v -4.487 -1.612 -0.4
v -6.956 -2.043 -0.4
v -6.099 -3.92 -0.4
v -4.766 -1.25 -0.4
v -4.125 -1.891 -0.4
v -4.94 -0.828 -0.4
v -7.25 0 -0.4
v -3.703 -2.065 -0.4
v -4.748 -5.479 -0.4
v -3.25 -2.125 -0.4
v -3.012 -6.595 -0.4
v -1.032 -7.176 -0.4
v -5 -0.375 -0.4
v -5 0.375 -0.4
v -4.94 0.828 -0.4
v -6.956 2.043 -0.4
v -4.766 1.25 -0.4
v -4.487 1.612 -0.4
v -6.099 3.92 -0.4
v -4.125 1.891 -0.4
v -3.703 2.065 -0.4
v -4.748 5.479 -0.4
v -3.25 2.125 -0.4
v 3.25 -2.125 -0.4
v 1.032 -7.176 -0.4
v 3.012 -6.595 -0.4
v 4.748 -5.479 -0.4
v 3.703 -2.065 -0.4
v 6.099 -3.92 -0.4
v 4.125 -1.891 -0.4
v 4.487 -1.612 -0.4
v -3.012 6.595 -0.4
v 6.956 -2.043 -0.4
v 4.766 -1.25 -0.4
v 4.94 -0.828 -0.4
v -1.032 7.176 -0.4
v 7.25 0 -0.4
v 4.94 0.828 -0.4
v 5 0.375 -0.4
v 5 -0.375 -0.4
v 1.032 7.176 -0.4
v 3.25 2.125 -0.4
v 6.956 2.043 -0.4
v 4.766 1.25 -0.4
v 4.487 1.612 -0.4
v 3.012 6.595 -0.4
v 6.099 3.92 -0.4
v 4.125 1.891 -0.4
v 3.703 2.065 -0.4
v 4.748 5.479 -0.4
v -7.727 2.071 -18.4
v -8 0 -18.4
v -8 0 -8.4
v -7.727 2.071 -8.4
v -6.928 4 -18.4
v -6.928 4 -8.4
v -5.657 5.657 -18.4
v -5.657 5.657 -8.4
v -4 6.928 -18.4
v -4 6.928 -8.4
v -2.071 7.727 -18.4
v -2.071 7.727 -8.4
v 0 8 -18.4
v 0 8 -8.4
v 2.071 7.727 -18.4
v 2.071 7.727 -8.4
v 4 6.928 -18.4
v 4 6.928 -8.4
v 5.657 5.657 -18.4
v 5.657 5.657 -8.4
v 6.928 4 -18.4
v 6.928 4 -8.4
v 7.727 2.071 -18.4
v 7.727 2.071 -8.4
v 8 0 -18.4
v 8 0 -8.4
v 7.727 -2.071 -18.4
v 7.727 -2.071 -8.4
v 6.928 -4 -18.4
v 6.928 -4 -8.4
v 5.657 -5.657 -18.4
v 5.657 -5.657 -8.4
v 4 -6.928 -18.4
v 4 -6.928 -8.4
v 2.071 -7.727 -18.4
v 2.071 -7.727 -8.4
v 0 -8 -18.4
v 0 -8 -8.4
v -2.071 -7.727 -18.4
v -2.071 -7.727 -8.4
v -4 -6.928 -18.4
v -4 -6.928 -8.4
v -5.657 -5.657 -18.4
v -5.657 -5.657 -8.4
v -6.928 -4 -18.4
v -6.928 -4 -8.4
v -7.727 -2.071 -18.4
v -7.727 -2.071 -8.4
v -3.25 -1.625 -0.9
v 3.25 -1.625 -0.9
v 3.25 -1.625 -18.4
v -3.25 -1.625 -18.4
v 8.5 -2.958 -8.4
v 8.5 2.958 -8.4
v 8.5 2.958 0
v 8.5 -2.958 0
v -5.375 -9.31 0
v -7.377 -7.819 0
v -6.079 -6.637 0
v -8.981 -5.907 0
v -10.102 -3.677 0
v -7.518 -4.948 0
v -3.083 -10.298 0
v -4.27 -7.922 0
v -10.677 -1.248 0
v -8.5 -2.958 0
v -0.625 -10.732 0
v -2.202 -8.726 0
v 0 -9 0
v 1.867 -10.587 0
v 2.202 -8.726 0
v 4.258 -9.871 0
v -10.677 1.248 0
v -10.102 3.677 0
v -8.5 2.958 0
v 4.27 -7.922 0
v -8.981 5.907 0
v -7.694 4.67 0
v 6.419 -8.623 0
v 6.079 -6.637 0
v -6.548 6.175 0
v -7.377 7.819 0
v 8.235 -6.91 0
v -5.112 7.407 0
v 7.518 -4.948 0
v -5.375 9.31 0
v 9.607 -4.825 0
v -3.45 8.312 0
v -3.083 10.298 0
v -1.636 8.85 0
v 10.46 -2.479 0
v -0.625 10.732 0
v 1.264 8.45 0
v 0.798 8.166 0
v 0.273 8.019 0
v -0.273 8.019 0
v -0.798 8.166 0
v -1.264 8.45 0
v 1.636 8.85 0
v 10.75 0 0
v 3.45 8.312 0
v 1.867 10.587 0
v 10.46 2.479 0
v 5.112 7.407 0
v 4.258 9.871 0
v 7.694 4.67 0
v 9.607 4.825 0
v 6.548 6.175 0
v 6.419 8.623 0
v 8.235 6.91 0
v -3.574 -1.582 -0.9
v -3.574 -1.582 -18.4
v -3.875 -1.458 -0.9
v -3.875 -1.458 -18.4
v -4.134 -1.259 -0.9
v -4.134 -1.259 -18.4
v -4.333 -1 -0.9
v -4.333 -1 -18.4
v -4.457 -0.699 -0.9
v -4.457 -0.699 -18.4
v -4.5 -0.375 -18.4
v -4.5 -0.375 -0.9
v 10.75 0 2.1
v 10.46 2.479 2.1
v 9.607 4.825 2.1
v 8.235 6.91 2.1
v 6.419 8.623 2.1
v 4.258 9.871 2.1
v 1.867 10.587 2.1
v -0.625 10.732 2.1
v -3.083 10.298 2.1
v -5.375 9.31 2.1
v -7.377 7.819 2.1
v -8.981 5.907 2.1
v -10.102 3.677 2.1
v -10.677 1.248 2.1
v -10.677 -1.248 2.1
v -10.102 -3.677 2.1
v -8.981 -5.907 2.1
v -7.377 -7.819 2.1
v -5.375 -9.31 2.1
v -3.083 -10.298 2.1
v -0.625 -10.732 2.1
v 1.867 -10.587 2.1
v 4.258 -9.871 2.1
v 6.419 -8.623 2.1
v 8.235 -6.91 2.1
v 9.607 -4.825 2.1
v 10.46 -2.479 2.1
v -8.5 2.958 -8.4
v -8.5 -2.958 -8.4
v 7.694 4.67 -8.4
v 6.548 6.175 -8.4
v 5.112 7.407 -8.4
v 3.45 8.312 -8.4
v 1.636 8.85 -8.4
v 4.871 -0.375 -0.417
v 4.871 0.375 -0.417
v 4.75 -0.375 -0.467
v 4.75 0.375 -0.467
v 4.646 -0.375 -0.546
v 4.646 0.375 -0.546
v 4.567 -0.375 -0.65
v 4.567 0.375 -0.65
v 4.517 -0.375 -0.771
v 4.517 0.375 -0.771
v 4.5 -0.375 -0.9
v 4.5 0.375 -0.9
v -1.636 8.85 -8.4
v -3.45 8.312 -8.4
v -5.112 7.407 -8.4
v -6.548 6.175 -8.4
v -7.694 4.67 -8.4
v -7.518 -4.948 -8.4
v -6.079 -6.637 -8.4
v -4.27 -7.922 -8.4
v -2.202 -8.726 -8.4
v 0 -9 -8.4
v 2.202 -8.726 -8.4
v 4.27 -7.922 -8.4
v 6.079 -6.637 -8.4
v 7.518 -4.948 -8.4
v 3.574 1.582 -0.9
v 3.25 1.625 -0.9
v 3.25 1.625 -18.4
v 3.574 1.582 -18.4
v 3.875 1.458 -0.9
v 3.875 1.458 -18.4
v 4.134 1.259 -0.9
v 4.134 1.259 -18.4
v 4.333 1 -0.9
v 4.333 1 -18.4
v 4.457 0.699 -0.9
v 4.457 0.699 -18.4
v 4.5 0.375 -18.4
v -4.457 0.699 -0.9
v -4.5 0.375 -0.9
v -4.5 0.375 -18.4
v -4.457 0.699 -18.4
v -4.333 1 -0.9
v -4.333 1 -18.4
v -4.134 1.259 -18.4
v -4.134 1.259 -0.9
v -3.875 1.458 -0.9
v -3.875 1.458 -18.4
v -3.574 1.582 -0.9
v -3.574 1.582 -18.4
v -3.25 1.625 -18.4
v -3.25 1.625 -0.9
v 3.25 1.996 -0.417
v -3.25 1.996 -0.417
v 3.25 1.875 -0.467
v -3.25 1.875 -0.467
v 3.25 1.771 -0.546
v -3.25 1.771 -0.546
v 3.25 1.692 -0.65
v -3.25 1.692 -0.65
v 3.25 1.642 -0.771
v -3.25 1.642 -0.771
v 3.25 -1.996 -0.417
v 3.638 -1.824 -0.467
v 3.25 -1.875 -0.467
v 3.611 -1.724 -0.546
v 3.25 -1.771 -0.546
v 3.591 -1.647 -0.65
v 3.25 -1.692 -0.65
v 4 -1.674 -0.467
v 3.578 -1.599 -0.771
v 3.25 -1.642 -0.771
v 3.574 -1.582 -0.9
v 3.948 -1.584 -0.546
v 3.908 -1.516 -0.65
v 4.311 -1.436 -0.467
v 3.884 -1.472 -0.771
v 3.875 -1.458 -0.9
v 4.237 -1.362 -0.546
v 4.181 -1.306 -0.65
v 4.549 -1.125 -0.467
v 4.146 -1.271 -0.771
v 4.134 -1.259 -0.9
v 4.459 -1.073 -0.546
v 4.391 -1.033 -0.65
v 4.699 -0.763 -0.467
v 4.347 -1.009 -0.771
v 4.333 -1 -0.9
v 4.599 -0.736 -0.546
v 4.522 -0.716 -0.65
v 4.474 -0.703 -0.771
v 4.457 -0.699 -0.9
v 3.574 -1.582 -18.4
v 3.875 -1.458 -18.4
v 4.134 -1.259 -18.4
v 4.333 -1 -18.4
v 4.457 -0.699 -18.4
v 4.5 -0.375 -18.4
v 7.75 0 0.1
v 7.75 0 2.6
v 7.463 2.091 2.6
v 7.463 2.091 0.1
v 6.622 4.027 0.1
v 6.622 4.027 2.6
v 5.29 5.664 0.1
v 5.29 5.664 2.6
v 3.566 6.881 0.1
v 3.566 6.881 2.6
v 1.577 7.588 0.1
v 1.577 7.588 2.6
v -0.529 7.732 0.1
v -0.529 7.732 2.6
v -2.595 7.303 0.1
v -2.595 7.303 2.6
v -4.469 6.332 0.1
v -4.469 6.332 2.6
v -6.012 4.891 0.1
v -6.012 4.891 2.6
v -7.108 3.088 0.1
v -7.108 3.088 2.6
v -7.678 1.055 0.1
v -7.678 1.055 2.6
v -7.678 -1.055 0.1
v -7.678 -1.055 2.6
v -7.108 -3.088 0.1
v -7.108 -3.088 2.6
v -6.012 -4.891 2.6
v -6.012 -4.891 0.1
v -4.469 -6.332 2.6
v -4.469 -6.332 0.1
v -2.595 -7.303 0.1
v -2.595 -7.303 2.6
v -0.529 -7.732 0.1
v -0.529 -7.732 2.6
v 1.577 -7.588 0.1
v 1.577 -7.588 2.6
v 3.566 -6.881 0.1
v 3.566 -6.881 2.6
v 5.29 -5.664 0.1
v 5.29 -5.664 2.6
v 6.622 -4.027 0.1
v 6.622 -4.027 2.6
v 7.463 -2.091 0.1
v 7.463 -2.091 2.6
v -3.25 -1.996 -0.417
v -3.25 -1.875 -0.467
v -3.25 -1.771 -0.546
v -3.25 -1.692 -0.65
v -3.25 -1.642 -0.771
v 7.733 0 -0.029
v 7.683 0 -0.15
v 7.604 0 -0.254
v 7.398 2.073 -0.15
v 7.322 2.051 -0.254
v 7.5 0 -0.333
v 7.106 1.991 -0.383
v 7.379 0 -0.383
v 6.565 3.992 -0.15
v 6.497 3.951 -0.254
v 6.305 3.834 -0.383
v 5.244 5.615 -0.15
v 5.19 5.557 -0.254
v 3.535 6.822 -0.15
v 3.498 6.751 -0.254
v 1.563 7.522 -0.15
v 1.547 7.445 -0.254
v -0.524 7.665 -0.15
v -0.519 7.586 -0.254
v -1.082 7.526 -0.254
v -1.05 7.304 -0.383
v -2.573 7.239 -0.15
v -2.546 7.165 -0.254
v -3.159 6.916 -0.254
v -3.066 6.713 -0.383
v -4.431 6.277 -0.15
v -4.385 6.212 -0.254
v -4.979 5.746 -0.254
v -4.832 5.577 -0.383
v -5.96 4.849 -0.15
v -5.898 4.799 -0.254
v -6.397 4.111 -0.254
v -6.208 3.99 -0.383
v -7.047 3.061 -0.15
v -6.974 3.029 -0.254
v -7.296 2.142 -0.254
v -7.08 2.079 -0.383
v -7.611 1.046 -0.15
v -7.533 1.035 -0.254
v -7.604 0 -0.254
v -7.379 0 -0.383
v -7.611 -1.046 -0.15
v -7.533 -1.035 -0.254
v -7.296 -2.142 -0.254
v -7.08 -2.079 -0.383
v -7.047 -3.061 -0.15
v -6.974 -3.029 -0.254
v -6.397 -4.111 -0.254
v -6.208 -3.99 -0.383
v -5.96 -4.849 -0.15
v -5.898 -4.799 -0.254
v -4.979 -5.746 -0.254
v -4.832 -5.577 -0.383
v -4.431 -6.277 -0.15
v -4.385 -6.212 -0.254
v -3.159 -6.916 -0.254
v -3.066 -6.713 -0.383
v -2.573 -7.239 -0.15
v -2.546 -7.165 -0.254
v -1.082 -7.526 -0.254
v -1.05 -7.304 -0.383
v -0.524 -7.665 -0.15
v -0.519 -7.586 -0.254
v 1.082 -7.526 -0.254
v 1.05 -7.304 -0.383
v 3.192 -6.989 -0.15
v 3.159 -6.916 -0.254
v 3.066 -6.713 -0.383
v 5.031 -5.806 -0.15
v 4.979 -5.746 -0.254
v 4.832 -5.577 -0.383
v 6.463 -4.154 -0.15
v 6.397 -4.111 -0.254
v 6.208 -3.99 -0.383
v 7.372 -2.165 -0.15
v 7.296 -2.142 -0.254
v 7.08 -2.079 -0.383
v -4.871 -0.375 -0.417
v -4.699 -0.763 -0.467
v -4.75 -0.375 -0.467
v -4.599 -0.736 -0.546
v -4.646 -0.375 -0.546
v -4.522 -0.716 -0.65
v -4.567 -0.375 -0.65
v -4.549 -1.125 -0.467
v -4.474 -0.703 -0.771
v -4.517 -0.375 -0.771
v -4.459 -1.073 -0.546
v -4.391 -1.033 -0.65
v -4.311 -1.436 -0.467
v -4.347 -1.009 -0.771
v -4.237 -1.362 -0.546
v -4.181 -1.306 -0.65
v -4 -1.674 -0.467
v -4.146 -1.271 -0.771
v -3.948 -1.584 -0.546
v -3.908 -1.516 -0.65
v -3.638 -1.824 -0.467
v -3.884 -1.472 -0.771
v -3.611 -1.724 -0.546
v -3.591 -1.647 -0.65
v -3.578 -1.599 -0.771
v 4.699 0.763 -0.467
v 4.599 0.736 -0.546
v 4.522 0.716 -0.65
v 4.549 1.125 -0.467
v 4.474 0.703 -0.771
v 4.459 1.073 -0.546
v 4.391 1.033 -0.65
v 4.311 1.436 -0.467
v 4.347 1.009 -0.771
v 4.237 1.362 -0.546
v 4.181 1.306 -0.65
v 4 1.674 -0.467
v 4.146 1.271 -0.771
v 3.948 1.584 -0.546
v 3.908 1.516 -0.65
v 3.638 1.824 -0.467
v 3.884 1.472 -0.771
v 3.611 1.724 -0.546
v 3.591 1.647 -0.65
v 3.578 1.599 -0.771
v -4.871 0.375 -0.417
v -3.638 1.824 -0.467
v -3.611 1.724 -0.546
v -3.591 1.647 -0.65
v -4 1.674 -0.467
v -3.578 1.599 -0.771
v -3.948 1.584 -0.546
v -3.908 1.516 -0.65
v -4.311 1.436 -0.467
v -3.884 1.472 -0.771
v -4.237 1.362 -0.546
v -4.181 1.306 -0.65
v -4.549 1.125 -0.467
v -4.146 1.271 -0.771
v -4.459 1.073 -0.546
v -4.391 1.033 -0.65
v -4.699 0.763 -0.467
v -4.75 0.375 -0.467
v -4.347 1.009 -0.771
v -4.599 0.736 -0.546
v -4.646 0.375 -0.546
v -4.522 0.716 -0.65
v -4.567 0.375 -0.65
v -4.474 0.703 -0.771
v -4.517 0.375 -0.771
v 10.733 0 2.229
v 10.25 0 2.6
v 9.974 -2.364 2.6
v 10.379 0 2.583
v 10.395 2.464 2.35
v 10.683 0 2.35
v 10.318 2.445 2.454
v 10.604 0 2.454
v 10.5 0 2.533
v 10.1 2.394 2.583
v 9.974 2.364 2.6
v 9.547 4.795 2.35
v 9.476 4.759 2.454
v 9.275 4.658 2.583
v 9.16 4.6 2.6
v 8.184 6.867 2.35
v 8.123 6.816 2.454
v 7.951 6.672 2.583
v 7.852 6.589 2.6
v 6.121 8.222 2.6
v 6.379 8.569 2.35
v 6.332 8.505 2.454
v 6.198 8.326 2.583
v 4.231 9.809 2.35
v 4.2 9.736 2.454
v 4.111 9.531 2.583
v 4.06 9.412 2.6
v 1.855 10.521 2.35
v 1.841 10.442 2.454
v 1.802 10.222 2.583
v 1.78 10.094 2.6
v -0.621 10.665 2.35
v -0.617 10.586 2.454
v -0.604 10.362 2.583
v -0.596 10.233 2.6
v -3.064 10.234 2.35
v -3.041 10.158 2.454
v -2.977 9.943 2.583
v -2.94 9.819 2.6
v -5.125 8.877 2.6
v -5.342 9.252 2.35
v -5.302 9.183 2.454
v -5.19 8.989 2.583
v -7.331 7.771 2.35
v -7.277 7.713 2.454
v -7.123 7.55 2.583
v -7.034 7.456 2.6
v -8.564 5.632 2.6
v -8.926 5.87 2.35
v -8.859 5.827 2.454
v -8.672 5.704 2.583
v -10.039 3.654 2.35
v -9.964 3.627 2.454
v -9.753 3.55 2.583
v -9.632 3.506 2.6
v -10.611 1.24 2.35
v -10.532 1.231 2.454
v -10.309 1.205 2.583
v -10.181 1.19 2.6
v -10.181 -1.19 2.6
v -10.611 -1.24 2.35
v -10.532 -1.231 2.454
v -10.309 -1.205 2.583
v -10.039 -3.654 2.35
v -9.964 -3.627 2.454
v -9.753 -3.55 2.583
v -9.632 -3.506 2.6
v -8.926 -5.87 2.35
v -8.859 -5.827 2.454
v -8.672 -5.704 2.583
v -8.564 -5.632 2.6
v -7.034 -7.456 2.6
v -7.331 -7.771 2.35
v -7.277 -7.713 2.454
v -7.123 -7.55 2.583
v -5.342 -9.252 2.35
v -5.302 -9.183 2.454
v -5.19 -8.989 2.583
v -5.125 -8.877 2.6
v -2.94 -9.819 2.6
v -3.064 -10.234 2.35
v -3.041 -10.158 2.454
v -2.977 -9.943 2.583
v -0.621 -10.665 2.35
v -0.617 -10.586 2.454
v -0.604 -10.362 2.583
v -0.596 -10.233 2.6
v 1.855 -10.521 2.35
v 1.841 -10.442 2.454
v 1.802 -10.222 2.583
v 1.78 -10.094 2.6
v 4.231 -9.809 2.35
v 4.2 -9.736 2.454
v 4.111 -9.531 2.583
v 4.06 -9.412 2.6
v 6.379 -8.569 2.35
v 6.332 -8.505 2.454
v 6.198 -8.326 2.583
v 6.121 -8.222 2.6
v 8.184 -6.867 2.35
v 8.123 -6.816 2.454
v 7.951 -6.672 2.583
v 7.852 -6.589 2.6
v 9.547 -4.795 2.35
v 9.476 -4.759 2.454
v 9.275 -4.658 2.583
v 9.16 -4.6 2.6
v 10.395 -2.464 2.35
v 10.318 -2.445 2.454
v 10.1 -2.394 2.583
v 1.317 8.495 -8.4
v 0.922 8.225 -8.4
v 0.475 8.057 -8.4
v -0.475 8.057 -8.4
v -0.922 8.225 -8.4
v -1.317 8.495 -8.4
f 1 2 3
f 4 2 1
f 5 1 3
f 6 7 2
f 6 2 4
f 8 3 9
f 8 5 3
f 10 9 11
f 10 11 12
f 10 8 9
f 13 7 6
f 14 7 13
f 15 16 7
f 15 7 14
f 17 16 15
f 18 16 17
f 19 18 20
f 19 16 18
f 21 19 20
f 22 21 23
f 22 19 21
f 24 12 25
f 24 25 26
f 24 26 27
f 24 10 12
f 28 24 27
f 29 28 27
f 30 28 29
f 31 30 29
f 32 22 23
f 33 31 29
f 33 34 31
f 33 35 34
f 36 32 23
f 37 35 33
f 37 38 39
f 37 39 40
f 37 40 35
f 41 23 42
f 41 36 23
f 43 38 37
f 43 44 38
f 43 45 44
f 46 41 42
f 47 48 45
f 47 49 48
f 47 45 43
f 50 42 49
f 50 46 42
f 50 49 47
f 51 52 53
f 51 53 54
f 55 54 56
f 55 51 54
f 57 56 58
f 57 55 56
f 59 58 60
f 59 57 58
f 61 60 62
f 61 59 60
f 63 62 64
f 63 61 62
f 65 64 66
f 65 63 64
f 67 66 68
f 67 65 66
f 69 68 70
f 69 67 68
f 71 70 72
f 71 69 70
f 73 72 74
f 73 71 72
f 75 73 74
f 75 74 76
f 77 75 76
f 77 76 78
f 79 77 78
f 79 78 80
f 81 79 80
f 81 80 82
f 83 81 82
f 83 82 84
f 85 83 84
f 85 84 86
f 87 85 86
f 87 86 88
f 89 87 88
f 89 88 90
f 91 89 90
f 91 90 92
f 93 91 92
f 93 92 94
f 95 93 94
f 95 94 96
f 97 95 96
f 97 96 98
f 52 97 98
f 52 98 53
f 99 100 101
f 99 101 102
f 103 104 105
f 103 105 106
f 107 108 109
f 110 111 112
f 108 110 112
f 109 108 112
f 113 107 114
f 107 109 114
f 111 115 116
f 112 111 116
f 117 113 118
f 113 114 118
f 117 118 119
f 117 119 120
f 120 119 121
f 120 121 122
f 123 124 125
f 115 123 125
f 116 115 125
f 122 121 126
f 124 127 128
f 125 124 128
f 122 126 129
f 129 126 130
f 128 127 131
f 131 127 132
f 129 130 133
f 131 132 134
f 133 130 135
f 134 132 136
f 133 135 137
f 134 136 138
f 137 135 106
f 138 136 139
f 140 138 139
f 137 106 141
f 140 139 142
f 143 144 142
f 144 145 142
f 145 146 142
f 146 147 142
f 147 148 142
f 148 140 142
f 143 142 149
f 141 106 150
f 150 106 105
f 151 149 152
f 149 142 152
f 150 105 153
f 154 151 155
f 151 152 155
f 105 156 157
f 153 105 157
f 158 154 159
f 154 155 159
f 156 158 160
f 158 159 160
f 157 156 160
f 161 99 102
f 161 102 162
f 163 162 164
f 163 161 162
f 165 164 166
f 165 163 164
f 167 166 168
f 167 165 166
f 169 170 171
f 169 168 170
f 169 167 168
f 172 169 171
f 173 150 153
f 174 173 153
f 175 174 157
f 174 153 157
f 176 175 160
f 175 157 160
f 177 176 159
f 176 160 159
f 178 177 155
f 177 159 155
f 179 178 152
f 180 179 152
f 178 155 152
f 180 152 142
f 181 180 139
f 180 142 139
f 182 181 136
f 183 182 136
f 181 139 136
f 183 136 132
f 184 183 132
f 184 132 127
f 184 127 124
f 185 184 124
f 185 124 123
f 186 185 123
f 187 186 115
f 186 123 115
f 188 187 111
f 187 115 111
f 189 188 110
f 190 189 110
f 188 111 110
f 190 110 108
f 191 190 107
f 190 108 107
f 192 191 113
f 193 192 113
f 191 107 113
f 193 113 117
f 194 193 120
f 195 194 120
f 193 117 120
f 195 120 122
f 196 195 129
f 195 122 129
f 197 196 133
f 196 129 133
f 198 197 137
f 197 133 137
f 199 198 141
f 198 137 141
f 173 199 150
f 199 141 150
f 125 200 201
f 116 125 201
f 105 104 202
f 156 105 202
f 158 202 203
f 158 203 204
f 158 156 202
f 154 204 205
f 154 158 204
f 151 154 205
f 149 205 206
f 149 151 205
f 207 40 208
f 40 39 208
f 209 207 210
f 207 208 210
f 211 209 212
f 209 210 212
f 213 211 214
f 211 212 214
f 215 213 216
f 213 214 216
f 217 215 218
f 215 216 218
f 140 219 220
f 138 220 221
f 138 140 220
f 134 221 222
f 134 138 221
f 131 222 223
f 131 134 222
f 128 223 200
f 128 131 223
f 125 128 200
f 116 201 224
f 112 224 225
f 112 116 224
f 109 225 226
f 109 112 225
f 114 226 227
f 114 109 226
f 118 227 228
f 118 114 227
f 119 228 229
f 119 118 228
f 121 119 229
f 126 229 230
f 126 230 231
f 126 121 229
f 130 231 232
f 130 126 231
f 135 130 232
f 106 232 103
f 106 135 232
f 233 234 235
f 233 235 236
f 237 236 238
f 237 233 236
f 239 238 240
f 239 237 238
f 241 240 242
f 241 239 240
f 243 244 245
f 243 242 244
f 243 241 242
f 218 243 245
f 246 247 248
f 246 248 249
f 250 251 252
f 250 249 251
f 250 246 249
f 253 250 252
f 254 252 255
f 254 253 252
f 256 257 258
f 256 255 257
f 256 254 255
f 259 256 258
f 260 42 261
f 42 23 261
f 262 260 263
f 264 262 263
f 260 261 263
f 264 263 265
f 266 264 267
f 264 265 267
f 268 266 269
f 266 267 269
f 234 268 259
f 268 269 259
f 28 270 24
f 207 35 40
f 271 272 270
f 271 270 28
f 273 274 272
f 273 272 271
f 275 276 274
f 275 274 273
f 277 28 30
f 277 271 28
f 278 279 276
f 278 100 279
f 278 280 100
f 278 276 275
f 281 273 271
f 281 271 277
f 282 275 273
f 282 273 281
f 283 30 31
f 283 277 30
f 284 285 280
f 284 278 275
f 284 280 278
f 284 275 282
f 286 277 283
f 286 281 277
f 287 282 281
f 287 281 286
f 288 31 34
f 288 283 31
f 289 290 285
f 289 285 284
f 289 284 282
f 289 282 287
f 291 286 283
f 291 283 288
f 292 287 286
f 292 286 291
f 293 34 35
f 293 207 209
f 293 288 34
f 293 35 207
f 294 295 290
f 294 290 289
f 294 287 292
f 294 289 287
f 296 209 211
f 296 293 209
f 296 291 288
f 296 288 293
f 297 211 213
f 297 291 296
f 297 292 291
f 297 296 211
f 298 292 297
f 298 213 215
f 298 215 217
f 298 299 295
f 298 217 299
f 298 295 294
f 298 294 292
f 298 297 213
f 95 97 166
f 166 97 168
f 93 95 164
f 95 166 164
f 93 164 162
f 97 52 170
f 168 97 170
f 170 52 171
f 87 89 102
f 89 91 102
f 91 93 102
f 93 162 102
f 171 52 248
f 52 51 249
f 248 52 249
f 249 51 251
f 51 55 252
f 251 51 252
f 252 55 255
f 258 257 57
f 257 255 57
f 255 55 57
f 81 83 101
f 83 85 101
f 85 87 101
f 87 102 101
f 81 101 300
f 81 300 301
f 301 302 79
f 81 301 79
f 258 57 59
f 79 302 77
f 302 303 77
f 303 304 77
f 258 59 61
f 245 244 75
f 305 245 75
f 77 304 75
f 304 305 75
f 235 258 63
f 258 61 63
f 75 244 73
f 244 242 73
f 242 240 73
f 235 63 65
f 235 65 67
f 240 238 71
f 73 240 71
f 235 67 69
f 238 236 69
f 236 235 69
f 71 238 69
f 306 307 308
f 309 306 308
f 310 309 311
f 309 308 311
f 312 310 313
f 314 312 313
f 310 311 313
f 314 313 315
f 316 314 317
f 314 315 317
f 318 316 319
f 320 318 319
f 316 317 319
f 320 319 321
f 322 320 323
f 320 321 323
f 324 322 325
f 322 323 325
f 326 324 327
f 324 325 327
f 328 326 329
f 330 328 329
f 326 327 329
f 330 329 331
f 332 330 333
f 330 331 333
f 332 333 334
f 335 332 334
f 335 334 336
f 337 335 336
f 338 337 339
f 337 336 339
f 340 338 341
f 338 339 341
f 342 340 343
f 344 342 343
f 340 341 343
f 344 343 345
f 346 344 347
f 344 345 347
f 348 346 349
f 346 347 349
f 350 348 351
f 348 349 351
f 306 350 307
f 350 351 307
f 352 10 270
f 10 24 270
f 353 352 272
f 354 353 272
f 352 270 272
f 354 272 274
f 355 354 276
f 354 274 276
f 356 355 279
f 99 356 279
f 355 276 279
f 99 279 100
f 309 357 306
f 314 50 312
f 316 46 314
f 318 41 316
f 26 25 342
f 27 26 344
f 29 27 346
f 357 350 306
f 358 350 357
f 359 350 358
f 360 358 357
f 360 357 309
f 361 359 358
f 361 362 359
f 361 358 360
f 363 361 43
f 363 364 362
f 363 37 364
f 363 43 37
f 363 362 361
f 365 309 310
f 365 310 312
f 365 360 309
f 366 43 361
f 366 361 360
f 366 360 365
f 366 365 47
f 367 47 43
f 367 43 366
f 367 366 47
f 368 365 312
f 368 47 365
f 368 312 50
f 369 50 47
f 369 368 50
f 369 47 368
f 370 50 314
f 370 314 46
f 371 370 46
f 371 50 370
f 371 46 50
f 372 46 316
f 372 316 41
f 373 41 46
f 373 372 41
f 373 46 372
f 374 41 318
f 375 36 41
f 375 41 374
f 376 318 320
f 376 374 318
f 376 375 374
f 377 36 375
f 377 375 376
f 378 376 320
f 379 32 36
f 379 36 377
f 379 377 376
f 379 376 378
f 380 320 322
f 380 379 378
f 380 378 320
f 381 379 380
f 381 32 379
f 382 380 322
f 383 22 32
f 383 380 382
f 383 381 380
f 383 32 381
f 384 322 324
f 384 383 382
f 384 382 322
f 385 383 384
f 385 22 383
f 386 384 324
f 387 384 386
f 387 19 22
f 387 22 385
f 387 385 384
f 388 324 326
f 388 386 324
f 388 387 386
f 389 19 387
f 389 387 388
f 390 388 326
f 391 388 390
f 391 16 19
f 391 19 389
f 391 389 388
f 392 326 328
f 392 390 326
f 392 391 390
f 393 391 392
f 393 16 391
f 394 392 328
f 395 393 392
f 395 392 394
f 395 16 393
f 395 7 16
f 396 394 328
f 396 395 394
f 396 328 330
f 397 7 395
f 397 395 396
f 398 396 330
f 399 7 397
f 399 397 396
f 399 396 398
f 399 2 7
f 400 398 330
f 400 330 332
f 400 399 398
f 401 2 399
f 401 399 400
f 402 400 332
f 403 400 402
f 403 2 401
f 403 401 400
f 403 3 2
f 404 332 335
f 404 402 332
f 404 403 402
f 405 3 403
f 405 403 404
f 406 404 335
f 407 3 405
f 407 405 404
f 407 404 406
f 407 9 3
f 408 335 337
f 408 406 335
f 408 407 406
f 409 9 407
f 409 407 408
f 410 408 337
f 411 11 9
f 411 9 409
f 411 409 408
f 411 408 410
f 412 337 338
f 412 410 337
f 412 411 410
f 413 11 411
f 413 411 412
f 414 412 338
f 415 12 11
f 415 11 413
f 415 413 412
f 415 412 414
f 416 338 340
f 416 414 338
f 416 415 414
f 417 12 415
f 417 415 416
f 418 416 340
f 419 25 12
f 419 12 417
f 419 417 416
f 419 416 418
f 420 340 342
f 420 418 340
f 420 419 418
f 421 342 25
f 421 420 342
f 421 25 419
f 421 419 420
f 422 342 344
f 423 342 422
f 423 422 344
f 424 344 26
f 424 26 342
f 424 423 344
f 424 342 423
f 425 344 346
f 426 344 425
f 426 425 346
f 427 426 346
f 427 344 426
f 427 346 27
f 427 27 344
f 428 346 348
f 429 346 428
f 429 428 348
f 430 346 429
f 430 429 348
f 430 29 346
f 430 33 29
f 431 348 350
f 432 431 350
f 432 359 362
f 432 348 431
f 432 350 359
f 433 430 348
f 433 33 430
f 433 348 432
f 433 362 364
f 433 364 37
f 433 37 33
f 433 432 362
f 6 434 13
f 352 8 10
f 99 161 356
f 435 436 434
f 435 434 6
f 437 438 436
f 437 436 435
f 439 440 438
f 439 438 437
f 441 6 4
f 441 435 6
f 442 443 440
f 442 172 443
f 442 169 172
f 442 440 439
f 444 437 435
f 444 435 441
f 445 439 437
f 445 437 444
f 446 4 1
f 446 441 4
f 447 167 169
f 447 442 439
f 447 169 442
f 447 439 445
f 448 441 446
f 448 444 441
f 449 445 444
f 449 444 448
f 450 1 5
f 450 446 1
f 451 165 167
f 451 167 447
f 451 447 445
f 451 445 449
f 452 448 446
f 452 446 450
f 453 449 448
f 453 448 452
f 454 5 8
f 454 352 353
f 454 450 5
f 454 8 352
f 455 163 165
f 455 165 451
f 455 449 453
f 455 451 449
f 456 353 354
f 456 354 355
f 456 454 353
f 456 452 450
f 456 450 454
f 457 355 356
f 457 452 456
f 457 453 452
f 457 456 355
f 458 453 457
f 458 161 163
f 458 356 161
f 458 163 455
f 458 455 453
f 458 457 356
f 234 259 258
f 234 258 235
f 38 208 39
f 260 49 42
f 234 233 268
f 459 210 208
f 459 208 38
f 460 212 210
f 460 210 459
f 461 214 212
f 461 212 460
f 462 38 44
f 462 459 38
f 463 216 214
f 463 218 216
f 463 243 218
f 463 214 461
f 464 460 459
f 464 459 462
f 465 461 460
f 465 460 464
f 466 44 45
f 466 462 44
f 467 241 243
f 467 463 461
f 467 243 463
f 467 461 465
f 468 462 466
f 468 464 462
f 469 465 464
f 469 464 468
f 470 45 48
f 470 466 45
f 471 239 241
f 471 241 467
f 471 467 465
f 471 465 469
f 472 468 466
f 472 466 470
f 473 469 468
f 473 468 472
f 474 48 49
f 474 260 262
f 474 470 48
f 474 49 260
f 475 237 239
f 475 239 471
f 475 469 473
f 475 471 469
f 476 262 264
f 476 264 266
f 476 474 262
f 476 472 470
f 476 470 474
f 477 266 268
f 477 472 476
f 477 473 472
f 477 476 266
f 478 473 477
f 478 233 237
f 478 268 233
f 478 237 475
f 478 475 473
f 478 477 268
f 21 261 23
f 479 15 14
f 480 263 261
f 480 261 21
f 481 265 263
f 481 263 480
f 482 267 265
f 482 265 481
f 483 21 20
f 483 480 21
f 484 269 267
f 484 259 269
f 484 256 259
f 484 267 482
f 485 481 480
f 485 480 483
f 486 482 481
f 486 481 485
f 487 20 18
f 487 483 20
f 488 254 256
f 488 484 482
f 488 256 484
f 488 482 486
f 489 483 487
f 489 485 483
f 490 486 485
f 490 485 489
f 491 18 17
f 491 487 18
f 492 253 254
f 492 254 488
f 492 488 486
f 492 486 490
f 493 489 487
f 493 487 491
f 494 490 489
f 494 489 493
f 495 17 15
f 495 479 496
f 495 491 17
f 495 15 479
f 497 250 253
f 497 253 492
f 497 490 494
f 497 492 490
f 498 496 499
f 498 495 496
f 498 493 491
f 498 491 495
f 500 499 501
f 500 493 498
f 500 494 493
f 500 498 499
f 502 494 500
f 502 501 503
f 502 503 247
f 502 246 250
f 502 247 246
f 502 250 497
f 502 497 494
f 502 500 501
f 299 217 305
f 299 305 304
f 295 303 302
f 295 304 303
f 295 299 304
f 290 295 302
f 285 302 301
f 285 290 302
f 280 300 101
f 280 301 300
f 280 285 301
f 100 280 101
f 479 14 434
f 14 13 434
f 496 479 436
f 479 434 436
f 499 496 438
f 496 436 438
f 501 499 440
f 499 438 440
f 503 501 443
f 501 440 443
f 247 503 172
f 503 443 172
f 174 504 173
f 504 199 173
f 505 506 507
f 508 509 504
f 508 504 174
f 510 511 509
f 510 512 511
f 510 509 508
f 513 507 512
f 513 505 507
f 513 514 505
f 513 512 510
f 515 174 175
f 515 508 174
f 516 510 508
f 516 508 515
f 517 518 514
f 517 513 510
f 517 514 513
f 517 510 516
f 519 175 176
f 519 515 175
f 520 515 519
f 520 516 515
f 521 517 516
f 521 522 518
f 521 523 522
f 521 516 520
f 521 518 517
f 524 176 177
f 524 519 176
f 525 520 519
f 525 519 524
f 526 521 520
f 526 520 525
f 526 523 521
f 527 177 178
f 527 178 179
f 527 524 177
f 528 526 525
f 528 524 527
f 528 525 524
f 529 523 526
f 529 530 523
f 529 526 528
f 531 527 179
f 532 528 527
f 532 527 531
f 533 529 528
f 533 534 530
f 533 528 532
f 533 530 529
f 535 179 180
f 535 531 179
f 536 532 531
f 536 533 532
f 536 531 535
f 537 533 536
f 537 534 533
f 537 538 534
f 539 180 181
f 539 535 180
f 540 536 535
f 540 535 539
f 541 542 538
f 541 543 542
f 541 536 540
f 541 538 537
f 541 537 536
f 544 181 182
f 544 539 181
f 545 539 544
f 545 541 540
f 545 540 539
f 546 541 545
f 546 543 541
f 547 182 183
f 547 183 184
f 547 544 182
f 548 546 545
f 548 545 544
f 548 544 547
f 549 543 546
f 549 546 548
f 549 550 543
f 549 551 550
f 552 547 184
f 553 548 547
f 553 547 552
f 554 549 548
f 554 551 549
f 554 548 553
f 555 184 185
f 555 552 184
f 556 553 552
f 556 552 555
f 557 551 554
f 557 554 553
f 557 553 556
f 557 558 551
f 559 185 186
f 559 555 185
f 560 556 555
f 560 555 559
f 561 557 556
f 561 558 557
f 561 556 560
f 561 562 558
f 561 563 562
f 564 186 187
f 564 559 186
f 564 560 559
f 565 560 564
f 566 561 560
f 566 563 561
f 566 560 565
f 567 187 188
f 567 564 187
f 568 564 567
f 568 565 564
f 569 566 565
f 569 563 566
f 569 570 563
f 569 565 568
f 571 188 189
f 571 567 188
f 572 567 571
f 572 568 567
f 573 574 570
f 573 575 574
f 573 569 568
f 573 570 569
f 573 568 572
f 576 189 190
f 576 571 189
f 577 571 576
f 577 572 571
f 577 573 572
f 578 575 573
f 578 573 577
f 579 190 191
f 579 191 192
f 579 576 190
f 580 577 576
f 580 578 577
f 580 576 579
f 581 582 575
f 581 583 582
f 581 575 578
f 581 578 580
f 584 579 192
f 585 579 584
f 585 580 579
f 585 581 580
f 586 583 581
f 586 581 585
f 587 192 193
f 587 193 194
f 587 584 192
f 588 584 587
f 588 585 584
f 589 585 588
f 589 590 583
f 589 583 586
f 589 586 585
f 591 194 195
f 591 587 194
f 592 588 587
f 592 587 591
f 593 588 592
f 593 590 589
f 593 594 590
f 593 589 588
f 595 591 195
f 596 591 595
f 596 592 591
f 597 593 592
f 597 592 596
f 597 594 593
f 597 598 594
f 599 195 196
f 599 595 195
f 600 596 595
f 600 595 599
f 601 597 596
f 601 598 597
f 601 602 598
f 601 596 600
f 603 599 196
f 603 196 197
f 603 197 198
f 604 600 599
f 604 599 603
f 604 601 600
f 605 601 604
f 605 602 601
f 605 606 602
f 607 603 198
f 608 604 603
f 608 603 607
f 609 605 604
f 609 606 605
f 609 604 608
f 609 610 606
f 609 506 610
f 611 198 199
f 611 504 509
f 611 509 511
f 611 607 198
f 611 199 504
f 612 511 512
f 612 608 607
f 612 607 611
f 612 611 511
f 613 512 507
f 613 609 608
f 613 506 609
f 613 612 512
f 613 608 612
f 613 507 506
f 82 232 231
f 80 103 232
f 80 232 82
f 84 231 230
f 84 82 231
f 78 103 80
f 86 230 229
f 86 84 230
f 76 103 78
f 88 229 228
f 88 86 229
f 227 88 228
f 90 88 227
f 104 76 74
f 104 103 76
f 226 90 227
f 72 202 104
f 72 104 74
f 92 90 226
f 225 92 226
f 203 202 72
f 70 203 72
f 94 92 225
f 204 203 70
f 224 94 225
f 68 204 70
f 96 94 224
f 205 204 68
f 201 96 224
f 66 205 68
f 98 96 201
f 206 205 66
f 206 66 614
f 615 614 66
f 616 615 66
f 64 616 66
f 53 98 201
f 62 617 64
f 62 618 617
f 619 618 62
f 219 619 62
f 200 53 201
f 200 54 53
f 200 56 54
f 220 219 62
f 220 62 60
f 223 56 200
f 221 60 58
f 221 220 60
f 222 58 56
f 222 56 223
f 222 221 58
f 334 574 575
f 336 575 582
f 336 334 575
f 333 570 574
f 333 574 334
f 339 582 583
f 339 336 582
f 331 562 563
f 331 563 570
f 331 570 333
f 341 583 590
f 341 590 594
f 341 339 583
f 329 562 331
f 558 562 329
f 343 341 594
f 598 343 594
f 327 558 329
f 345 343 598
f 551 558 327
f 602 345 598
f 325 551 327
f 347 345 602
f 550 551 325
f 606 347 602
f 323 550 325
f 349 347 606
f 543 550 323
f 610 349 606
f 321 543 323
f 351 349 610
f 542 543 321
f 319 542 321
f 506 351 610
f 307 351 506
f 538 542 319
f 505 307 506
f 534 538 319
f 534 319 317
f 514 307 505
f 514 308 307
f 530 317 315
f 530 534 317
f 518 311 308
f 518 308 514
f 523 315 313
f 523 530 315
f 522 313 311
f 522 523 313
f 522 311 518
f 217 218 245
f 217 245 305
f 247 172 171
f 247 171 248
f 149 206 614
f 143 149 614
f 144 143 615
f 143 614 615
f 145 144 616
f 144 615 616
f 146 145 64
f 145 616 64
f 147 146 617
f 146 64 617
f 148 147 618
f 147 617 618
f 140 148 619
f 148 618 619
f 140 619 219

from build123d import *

# Parameters (mm, degrees)
SKETCH1_R           = 9
BOSS_EXTRUDE1_DEPTH = 18.4
SKETCH2_R           = 10.75
BOSS_EXTRUDE2_DEPTH = 2.6
SKETCH3_R           = 7.75
CUT_EXTRUDE1_DEPTH  = 3
SKETCH4_R           = 9
SKETCH4_R_2         = 8
CUT_EXTRUDE2_DEPTH  = 10
CUT_EXTRUDE3_DEPTH  = 8.4
CUT_EXTRUDE4_DEPTH  = 19.4
FILLET1_R           = 0.5


with BuildPart() as part:
    # Sketch1 → Boss-Extrude1 (new body)
    with BuildSketch(Plane.XY):
        Circle(SKETCH1_R)
    extrude(amount=-BOSS_EXTRUDE1_DEPTH)

    # Sketch2 → Boss-Extrude2 (add)
    with BuildSketch(Plane.XY):
        Circle(SKETCH2_R)
    extrude(amount=BOSS_EXTRUDE2_DEPTH)

    # Sketch3 → Cut-Extrude1 (cut)
    with BuildSketch(Plane.XY.offset(2.6)):
        Circle(SKETCH3_R)
    extrude(amount=-CUT_EXTRUDE1_DEPTH, mode=Mode.SUBTRACT)

    # Sketch4 → Cut-Extrude2 (cut)
    with BuildSketch(Plane(origin=(0, 0, -18.4), x_dir=(-1, 0, 0), z_dir=(0, 0, -1))):
        Circle(SKETCH4_R)
        Circle(SKETCH4_R_2, mode=Mode.SUBTRACT)
    extrude(amount=-CUT_EXTRUDE2_DEPTH, mode=Mode.SUBTRACT)

    # Sketch5 → Cut-Extrude3 (cut)
    with BuildSketch(Plane(origin=(0, 0, -8.4), x_dir=(-1, 0, 0), z_dir=(0, 0, -1))):
        with BuildLine():
            Line((-8.5, 2.958039892), (-8.5, -2.958039892))
            ThreePointArc((-8.5, -2.958039892), (-9, 0), (-8.5, 2.958039892))
        make_face()
        with BuildLine():
            Line((8.5, 2.958039892), (8.5, -2.958039892))
            ThreePointArc((8.5, -2.958039892), (9, 0), (8.5, 2.958039892))
        make_face()
        with BuildLine():
            ThreePointArc((-1.636306817, 8.85), (0, 8), (1.636306817, 8.85))
            ThreePointArc((1.636306817, 8.85), (0, 9), (-1.636306817, 8.85))
        make_face()
    extrude(amount=-CUT_EXTRUDE3_DEPTH, mode=Mode.SUBTRACT)

    # Sketch6 → Cut-Extrude4 (cut, through all)
    with BuildSketch(Plane.XY):
        with BuildLine():
            Line((-3.25, 1.625), (3.25, 1.625))
            ThreePointArc((3.25, 1.625), (4.133883476, 1.258883476), (4.5, 0.375))
            Line((4.5, 0.375), (4.5, -0.375))
            ThreePointArc((4.5, -0.375), (4.133883476, -1.258883476), (3.25, -1.625))
            Line((3.25, -1.625), (-3.25, -1.625))
            ThreePointArc((-3.25, -1.625), (-4.133883476, -1.258883476), (-4.5, -0.375))
            Line((-4.5, -0.375), (-4.5, 0.375))
            ThreePointArc((-4.5, 0.375), (-4.133883476, 1.258883476), (-3.25, 1.625))
        make_face()
    extrude(amount=-CUT_EXTRUDE4_DEPTH, mode=Mode.SUBTRACT)

    # Fillet1
    fillet1_edges = [part.edges().sort_by_distance(p)[0] for p in [
        (-7.75, 0, -0.4),
        (-4.133883476, 1.258883476, -0.4),
        (0, 1.625, -0.4),
        (4.133883476, 1.258883476, -0.4),
        (4.5, 0, -0.4),
        (4.133883476, -1.258883476, -0.4),
        (0, -1.625, -0.4),
        (-4.133883476, -1.258883476, -0.4),
        (-4.5, 0, -0.4),
        (-10.75, 0, 2.6),
    ]]
    fillet(fillet1_edges, radius=FILLET1_R)


solid = part.part
